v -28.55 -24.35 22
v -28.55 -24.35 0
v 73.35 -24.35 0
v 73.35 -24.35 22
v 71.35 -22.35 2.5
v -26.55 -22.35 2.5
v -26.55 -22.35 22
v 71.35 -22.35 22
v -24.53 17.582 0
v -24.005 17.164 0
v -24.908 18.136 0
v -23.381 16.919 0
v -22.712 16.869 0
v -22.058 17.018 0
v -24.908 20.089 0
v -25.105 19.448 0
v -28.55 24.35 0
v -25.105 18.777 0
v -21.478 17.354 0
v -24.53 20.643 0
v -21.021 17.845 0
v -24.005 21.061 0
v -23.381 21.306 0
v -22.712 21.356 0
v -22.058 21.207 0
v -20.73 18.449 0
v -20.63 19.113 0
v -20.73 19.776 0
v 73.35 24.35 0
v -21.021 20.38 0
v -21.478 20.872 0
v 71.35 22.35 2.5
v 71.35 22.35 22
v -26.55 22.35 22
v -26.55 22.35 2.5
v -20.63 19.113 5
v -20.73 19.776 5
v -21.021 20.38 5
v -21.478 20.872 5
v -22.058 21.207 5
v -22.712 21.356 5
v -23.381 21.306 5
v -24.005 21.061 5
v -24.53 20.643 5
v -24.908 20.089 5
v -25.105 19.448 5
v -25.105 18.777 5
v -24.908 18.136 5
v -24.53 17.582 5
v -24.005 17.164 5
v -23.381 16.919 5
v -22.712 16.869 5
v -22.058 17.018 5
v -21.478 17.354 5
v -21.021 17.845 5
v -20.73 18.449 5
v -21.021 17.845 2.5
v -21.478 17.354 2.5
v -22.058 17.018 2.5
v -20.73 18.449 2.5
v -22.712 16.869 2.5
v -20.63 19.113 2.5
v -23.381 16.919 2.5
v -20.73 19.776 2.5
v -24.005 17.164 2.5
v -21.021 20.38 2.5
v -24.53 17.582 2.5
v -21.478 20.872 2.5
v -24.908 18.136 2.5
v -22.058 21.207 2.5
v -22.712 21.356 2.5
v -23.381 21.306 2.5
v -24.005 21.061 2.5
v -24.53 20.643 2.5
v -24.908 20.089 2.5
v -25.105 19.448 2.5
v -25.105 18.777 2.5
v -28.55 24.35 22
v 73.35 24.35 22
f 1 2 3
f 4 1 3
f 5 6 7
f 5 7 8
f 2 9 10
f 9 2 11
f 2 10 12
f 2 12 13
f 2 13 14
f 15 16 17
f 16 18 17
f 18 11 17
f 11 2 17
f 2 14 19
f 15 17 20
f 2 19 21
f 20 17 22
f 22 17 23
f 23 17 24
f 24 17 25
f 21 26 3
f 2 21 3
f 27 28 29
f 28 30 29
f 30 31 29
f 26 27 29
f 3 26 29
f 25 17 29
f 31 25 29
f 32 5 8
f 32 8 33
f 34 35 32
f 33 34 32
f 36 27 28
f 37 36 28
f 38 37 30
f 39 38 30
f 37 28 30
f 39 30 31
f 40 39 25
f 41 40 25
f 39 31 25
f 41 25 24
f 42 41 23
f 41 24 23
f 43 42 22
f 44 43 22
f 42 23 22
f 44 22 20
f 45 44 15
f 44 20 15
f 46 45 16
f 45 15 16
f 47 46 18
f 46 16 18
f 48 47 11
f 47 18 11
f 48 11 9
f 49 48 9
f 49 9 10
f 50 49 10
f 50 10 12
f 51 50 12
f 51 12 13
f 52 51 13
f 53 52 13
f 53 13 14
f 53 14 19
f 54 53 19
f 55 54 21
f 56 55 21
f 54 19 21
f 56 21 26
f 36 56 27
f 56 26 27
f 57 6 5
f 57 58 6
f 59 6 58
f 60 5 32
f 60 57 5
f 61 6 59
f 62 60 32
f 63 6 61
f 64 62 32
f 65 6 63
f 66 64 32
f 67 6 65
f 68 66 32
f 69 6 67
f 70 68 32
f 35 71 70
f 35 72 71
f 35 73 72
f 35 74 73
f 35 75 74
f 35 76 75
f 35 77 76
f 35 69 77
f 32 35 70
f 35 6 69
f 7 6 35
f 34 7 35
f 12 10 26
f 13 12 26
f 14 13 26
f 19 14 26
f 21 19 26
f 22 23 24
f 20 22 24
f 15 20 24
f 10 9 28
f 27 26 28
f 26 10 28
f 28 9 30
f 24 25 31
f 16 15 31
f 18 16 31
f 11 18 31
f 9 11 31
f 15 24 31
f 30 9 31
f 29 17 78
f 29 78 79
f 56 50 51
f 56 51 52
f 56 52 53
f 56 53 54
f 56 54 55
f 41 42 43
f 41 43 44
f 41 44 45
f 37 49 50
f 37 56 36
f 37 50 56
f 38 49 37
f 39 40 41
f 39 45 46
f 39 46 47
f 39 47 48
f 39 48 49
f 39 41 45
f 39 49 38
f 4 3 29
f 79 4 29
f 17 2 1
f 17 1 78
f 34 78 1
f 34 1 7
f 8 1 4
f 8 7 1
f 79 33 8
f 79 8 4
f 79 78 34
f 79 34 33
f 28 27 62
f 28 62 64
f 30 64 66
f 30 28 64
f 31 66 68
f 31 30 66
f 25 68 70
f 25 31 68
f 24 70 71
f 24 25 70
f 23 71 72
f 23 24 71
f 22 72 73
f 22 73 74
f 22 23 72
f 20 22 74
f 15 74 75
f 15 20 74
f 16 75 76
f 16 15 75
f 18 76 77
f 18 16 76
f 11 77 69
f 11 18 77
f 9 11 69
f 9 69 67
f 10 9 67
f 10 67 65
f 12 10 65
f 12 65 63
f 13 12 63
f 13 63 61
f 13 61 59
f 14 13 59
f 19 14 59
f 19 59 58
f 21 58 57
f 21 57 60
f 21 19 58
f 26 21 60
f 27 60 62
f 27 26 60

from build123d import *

# Parameters (mm, degrees)
F0_R     = 2.25
F1_DEPTH = 5
F0_W     = 53.1
F0_H     = 44.7
F2_DEPTH = 2.5
F6_DEPTH = 44.8
F7_W     = 101.9
F7_H     = 48.7
F7_W_2   = 97.9
F7_H_2   = 44.7
F8_DEPTH = 22


# Not quite as in the source:
# - a feature names something its author has since deleted; it is built from what else it names
# - the program builds the solid bodies; features that only make, move or delete a surface that nothing else refers to are left out


with BuildPart() as f1:
    # F0 (on Top) → F1 (new body)
    with BuildSketch(Plane.XY):
        with Locations((-22.8803921491, 19.1126316786)):
            Circle(F0_R)
    extrude(amount=F1_DEPTH)


with BuildPart() as f2:
    # F0 (on Top) → F2 (new body)
    with BuildSketch(Plane.XY):
        Rectangle(F0_W, F0_H)
        with Locations((-22.8803921491, 19.1126316786)):
            Circle(F0_R, mode=Mode.SUBTRACT)
    extrude(amount=F2_DEPTH)

    # F6 (add): a face of the model
    f6_faces = [f2.faces().sort_by_distance(p)[0] for p in [
        (26.55, 0, 1.25),
    ]]
    extrude(f6_faces, amount=F6_DEPTH)

    # F7 (on Top) → F8 (join)
    with BuildSketch(Plane.XY):
        with Locations((22.4, 0)):
            Rectangle(F7_W, F7_H)
        with Locations((22.4, 0)):
            Rectangle(F7_W_2, F7_H_2, mode=Mode.SUBTRACT)
    extrude(amount=F8_DEPTH)


solid = Compound([f1.part, f2.part])
